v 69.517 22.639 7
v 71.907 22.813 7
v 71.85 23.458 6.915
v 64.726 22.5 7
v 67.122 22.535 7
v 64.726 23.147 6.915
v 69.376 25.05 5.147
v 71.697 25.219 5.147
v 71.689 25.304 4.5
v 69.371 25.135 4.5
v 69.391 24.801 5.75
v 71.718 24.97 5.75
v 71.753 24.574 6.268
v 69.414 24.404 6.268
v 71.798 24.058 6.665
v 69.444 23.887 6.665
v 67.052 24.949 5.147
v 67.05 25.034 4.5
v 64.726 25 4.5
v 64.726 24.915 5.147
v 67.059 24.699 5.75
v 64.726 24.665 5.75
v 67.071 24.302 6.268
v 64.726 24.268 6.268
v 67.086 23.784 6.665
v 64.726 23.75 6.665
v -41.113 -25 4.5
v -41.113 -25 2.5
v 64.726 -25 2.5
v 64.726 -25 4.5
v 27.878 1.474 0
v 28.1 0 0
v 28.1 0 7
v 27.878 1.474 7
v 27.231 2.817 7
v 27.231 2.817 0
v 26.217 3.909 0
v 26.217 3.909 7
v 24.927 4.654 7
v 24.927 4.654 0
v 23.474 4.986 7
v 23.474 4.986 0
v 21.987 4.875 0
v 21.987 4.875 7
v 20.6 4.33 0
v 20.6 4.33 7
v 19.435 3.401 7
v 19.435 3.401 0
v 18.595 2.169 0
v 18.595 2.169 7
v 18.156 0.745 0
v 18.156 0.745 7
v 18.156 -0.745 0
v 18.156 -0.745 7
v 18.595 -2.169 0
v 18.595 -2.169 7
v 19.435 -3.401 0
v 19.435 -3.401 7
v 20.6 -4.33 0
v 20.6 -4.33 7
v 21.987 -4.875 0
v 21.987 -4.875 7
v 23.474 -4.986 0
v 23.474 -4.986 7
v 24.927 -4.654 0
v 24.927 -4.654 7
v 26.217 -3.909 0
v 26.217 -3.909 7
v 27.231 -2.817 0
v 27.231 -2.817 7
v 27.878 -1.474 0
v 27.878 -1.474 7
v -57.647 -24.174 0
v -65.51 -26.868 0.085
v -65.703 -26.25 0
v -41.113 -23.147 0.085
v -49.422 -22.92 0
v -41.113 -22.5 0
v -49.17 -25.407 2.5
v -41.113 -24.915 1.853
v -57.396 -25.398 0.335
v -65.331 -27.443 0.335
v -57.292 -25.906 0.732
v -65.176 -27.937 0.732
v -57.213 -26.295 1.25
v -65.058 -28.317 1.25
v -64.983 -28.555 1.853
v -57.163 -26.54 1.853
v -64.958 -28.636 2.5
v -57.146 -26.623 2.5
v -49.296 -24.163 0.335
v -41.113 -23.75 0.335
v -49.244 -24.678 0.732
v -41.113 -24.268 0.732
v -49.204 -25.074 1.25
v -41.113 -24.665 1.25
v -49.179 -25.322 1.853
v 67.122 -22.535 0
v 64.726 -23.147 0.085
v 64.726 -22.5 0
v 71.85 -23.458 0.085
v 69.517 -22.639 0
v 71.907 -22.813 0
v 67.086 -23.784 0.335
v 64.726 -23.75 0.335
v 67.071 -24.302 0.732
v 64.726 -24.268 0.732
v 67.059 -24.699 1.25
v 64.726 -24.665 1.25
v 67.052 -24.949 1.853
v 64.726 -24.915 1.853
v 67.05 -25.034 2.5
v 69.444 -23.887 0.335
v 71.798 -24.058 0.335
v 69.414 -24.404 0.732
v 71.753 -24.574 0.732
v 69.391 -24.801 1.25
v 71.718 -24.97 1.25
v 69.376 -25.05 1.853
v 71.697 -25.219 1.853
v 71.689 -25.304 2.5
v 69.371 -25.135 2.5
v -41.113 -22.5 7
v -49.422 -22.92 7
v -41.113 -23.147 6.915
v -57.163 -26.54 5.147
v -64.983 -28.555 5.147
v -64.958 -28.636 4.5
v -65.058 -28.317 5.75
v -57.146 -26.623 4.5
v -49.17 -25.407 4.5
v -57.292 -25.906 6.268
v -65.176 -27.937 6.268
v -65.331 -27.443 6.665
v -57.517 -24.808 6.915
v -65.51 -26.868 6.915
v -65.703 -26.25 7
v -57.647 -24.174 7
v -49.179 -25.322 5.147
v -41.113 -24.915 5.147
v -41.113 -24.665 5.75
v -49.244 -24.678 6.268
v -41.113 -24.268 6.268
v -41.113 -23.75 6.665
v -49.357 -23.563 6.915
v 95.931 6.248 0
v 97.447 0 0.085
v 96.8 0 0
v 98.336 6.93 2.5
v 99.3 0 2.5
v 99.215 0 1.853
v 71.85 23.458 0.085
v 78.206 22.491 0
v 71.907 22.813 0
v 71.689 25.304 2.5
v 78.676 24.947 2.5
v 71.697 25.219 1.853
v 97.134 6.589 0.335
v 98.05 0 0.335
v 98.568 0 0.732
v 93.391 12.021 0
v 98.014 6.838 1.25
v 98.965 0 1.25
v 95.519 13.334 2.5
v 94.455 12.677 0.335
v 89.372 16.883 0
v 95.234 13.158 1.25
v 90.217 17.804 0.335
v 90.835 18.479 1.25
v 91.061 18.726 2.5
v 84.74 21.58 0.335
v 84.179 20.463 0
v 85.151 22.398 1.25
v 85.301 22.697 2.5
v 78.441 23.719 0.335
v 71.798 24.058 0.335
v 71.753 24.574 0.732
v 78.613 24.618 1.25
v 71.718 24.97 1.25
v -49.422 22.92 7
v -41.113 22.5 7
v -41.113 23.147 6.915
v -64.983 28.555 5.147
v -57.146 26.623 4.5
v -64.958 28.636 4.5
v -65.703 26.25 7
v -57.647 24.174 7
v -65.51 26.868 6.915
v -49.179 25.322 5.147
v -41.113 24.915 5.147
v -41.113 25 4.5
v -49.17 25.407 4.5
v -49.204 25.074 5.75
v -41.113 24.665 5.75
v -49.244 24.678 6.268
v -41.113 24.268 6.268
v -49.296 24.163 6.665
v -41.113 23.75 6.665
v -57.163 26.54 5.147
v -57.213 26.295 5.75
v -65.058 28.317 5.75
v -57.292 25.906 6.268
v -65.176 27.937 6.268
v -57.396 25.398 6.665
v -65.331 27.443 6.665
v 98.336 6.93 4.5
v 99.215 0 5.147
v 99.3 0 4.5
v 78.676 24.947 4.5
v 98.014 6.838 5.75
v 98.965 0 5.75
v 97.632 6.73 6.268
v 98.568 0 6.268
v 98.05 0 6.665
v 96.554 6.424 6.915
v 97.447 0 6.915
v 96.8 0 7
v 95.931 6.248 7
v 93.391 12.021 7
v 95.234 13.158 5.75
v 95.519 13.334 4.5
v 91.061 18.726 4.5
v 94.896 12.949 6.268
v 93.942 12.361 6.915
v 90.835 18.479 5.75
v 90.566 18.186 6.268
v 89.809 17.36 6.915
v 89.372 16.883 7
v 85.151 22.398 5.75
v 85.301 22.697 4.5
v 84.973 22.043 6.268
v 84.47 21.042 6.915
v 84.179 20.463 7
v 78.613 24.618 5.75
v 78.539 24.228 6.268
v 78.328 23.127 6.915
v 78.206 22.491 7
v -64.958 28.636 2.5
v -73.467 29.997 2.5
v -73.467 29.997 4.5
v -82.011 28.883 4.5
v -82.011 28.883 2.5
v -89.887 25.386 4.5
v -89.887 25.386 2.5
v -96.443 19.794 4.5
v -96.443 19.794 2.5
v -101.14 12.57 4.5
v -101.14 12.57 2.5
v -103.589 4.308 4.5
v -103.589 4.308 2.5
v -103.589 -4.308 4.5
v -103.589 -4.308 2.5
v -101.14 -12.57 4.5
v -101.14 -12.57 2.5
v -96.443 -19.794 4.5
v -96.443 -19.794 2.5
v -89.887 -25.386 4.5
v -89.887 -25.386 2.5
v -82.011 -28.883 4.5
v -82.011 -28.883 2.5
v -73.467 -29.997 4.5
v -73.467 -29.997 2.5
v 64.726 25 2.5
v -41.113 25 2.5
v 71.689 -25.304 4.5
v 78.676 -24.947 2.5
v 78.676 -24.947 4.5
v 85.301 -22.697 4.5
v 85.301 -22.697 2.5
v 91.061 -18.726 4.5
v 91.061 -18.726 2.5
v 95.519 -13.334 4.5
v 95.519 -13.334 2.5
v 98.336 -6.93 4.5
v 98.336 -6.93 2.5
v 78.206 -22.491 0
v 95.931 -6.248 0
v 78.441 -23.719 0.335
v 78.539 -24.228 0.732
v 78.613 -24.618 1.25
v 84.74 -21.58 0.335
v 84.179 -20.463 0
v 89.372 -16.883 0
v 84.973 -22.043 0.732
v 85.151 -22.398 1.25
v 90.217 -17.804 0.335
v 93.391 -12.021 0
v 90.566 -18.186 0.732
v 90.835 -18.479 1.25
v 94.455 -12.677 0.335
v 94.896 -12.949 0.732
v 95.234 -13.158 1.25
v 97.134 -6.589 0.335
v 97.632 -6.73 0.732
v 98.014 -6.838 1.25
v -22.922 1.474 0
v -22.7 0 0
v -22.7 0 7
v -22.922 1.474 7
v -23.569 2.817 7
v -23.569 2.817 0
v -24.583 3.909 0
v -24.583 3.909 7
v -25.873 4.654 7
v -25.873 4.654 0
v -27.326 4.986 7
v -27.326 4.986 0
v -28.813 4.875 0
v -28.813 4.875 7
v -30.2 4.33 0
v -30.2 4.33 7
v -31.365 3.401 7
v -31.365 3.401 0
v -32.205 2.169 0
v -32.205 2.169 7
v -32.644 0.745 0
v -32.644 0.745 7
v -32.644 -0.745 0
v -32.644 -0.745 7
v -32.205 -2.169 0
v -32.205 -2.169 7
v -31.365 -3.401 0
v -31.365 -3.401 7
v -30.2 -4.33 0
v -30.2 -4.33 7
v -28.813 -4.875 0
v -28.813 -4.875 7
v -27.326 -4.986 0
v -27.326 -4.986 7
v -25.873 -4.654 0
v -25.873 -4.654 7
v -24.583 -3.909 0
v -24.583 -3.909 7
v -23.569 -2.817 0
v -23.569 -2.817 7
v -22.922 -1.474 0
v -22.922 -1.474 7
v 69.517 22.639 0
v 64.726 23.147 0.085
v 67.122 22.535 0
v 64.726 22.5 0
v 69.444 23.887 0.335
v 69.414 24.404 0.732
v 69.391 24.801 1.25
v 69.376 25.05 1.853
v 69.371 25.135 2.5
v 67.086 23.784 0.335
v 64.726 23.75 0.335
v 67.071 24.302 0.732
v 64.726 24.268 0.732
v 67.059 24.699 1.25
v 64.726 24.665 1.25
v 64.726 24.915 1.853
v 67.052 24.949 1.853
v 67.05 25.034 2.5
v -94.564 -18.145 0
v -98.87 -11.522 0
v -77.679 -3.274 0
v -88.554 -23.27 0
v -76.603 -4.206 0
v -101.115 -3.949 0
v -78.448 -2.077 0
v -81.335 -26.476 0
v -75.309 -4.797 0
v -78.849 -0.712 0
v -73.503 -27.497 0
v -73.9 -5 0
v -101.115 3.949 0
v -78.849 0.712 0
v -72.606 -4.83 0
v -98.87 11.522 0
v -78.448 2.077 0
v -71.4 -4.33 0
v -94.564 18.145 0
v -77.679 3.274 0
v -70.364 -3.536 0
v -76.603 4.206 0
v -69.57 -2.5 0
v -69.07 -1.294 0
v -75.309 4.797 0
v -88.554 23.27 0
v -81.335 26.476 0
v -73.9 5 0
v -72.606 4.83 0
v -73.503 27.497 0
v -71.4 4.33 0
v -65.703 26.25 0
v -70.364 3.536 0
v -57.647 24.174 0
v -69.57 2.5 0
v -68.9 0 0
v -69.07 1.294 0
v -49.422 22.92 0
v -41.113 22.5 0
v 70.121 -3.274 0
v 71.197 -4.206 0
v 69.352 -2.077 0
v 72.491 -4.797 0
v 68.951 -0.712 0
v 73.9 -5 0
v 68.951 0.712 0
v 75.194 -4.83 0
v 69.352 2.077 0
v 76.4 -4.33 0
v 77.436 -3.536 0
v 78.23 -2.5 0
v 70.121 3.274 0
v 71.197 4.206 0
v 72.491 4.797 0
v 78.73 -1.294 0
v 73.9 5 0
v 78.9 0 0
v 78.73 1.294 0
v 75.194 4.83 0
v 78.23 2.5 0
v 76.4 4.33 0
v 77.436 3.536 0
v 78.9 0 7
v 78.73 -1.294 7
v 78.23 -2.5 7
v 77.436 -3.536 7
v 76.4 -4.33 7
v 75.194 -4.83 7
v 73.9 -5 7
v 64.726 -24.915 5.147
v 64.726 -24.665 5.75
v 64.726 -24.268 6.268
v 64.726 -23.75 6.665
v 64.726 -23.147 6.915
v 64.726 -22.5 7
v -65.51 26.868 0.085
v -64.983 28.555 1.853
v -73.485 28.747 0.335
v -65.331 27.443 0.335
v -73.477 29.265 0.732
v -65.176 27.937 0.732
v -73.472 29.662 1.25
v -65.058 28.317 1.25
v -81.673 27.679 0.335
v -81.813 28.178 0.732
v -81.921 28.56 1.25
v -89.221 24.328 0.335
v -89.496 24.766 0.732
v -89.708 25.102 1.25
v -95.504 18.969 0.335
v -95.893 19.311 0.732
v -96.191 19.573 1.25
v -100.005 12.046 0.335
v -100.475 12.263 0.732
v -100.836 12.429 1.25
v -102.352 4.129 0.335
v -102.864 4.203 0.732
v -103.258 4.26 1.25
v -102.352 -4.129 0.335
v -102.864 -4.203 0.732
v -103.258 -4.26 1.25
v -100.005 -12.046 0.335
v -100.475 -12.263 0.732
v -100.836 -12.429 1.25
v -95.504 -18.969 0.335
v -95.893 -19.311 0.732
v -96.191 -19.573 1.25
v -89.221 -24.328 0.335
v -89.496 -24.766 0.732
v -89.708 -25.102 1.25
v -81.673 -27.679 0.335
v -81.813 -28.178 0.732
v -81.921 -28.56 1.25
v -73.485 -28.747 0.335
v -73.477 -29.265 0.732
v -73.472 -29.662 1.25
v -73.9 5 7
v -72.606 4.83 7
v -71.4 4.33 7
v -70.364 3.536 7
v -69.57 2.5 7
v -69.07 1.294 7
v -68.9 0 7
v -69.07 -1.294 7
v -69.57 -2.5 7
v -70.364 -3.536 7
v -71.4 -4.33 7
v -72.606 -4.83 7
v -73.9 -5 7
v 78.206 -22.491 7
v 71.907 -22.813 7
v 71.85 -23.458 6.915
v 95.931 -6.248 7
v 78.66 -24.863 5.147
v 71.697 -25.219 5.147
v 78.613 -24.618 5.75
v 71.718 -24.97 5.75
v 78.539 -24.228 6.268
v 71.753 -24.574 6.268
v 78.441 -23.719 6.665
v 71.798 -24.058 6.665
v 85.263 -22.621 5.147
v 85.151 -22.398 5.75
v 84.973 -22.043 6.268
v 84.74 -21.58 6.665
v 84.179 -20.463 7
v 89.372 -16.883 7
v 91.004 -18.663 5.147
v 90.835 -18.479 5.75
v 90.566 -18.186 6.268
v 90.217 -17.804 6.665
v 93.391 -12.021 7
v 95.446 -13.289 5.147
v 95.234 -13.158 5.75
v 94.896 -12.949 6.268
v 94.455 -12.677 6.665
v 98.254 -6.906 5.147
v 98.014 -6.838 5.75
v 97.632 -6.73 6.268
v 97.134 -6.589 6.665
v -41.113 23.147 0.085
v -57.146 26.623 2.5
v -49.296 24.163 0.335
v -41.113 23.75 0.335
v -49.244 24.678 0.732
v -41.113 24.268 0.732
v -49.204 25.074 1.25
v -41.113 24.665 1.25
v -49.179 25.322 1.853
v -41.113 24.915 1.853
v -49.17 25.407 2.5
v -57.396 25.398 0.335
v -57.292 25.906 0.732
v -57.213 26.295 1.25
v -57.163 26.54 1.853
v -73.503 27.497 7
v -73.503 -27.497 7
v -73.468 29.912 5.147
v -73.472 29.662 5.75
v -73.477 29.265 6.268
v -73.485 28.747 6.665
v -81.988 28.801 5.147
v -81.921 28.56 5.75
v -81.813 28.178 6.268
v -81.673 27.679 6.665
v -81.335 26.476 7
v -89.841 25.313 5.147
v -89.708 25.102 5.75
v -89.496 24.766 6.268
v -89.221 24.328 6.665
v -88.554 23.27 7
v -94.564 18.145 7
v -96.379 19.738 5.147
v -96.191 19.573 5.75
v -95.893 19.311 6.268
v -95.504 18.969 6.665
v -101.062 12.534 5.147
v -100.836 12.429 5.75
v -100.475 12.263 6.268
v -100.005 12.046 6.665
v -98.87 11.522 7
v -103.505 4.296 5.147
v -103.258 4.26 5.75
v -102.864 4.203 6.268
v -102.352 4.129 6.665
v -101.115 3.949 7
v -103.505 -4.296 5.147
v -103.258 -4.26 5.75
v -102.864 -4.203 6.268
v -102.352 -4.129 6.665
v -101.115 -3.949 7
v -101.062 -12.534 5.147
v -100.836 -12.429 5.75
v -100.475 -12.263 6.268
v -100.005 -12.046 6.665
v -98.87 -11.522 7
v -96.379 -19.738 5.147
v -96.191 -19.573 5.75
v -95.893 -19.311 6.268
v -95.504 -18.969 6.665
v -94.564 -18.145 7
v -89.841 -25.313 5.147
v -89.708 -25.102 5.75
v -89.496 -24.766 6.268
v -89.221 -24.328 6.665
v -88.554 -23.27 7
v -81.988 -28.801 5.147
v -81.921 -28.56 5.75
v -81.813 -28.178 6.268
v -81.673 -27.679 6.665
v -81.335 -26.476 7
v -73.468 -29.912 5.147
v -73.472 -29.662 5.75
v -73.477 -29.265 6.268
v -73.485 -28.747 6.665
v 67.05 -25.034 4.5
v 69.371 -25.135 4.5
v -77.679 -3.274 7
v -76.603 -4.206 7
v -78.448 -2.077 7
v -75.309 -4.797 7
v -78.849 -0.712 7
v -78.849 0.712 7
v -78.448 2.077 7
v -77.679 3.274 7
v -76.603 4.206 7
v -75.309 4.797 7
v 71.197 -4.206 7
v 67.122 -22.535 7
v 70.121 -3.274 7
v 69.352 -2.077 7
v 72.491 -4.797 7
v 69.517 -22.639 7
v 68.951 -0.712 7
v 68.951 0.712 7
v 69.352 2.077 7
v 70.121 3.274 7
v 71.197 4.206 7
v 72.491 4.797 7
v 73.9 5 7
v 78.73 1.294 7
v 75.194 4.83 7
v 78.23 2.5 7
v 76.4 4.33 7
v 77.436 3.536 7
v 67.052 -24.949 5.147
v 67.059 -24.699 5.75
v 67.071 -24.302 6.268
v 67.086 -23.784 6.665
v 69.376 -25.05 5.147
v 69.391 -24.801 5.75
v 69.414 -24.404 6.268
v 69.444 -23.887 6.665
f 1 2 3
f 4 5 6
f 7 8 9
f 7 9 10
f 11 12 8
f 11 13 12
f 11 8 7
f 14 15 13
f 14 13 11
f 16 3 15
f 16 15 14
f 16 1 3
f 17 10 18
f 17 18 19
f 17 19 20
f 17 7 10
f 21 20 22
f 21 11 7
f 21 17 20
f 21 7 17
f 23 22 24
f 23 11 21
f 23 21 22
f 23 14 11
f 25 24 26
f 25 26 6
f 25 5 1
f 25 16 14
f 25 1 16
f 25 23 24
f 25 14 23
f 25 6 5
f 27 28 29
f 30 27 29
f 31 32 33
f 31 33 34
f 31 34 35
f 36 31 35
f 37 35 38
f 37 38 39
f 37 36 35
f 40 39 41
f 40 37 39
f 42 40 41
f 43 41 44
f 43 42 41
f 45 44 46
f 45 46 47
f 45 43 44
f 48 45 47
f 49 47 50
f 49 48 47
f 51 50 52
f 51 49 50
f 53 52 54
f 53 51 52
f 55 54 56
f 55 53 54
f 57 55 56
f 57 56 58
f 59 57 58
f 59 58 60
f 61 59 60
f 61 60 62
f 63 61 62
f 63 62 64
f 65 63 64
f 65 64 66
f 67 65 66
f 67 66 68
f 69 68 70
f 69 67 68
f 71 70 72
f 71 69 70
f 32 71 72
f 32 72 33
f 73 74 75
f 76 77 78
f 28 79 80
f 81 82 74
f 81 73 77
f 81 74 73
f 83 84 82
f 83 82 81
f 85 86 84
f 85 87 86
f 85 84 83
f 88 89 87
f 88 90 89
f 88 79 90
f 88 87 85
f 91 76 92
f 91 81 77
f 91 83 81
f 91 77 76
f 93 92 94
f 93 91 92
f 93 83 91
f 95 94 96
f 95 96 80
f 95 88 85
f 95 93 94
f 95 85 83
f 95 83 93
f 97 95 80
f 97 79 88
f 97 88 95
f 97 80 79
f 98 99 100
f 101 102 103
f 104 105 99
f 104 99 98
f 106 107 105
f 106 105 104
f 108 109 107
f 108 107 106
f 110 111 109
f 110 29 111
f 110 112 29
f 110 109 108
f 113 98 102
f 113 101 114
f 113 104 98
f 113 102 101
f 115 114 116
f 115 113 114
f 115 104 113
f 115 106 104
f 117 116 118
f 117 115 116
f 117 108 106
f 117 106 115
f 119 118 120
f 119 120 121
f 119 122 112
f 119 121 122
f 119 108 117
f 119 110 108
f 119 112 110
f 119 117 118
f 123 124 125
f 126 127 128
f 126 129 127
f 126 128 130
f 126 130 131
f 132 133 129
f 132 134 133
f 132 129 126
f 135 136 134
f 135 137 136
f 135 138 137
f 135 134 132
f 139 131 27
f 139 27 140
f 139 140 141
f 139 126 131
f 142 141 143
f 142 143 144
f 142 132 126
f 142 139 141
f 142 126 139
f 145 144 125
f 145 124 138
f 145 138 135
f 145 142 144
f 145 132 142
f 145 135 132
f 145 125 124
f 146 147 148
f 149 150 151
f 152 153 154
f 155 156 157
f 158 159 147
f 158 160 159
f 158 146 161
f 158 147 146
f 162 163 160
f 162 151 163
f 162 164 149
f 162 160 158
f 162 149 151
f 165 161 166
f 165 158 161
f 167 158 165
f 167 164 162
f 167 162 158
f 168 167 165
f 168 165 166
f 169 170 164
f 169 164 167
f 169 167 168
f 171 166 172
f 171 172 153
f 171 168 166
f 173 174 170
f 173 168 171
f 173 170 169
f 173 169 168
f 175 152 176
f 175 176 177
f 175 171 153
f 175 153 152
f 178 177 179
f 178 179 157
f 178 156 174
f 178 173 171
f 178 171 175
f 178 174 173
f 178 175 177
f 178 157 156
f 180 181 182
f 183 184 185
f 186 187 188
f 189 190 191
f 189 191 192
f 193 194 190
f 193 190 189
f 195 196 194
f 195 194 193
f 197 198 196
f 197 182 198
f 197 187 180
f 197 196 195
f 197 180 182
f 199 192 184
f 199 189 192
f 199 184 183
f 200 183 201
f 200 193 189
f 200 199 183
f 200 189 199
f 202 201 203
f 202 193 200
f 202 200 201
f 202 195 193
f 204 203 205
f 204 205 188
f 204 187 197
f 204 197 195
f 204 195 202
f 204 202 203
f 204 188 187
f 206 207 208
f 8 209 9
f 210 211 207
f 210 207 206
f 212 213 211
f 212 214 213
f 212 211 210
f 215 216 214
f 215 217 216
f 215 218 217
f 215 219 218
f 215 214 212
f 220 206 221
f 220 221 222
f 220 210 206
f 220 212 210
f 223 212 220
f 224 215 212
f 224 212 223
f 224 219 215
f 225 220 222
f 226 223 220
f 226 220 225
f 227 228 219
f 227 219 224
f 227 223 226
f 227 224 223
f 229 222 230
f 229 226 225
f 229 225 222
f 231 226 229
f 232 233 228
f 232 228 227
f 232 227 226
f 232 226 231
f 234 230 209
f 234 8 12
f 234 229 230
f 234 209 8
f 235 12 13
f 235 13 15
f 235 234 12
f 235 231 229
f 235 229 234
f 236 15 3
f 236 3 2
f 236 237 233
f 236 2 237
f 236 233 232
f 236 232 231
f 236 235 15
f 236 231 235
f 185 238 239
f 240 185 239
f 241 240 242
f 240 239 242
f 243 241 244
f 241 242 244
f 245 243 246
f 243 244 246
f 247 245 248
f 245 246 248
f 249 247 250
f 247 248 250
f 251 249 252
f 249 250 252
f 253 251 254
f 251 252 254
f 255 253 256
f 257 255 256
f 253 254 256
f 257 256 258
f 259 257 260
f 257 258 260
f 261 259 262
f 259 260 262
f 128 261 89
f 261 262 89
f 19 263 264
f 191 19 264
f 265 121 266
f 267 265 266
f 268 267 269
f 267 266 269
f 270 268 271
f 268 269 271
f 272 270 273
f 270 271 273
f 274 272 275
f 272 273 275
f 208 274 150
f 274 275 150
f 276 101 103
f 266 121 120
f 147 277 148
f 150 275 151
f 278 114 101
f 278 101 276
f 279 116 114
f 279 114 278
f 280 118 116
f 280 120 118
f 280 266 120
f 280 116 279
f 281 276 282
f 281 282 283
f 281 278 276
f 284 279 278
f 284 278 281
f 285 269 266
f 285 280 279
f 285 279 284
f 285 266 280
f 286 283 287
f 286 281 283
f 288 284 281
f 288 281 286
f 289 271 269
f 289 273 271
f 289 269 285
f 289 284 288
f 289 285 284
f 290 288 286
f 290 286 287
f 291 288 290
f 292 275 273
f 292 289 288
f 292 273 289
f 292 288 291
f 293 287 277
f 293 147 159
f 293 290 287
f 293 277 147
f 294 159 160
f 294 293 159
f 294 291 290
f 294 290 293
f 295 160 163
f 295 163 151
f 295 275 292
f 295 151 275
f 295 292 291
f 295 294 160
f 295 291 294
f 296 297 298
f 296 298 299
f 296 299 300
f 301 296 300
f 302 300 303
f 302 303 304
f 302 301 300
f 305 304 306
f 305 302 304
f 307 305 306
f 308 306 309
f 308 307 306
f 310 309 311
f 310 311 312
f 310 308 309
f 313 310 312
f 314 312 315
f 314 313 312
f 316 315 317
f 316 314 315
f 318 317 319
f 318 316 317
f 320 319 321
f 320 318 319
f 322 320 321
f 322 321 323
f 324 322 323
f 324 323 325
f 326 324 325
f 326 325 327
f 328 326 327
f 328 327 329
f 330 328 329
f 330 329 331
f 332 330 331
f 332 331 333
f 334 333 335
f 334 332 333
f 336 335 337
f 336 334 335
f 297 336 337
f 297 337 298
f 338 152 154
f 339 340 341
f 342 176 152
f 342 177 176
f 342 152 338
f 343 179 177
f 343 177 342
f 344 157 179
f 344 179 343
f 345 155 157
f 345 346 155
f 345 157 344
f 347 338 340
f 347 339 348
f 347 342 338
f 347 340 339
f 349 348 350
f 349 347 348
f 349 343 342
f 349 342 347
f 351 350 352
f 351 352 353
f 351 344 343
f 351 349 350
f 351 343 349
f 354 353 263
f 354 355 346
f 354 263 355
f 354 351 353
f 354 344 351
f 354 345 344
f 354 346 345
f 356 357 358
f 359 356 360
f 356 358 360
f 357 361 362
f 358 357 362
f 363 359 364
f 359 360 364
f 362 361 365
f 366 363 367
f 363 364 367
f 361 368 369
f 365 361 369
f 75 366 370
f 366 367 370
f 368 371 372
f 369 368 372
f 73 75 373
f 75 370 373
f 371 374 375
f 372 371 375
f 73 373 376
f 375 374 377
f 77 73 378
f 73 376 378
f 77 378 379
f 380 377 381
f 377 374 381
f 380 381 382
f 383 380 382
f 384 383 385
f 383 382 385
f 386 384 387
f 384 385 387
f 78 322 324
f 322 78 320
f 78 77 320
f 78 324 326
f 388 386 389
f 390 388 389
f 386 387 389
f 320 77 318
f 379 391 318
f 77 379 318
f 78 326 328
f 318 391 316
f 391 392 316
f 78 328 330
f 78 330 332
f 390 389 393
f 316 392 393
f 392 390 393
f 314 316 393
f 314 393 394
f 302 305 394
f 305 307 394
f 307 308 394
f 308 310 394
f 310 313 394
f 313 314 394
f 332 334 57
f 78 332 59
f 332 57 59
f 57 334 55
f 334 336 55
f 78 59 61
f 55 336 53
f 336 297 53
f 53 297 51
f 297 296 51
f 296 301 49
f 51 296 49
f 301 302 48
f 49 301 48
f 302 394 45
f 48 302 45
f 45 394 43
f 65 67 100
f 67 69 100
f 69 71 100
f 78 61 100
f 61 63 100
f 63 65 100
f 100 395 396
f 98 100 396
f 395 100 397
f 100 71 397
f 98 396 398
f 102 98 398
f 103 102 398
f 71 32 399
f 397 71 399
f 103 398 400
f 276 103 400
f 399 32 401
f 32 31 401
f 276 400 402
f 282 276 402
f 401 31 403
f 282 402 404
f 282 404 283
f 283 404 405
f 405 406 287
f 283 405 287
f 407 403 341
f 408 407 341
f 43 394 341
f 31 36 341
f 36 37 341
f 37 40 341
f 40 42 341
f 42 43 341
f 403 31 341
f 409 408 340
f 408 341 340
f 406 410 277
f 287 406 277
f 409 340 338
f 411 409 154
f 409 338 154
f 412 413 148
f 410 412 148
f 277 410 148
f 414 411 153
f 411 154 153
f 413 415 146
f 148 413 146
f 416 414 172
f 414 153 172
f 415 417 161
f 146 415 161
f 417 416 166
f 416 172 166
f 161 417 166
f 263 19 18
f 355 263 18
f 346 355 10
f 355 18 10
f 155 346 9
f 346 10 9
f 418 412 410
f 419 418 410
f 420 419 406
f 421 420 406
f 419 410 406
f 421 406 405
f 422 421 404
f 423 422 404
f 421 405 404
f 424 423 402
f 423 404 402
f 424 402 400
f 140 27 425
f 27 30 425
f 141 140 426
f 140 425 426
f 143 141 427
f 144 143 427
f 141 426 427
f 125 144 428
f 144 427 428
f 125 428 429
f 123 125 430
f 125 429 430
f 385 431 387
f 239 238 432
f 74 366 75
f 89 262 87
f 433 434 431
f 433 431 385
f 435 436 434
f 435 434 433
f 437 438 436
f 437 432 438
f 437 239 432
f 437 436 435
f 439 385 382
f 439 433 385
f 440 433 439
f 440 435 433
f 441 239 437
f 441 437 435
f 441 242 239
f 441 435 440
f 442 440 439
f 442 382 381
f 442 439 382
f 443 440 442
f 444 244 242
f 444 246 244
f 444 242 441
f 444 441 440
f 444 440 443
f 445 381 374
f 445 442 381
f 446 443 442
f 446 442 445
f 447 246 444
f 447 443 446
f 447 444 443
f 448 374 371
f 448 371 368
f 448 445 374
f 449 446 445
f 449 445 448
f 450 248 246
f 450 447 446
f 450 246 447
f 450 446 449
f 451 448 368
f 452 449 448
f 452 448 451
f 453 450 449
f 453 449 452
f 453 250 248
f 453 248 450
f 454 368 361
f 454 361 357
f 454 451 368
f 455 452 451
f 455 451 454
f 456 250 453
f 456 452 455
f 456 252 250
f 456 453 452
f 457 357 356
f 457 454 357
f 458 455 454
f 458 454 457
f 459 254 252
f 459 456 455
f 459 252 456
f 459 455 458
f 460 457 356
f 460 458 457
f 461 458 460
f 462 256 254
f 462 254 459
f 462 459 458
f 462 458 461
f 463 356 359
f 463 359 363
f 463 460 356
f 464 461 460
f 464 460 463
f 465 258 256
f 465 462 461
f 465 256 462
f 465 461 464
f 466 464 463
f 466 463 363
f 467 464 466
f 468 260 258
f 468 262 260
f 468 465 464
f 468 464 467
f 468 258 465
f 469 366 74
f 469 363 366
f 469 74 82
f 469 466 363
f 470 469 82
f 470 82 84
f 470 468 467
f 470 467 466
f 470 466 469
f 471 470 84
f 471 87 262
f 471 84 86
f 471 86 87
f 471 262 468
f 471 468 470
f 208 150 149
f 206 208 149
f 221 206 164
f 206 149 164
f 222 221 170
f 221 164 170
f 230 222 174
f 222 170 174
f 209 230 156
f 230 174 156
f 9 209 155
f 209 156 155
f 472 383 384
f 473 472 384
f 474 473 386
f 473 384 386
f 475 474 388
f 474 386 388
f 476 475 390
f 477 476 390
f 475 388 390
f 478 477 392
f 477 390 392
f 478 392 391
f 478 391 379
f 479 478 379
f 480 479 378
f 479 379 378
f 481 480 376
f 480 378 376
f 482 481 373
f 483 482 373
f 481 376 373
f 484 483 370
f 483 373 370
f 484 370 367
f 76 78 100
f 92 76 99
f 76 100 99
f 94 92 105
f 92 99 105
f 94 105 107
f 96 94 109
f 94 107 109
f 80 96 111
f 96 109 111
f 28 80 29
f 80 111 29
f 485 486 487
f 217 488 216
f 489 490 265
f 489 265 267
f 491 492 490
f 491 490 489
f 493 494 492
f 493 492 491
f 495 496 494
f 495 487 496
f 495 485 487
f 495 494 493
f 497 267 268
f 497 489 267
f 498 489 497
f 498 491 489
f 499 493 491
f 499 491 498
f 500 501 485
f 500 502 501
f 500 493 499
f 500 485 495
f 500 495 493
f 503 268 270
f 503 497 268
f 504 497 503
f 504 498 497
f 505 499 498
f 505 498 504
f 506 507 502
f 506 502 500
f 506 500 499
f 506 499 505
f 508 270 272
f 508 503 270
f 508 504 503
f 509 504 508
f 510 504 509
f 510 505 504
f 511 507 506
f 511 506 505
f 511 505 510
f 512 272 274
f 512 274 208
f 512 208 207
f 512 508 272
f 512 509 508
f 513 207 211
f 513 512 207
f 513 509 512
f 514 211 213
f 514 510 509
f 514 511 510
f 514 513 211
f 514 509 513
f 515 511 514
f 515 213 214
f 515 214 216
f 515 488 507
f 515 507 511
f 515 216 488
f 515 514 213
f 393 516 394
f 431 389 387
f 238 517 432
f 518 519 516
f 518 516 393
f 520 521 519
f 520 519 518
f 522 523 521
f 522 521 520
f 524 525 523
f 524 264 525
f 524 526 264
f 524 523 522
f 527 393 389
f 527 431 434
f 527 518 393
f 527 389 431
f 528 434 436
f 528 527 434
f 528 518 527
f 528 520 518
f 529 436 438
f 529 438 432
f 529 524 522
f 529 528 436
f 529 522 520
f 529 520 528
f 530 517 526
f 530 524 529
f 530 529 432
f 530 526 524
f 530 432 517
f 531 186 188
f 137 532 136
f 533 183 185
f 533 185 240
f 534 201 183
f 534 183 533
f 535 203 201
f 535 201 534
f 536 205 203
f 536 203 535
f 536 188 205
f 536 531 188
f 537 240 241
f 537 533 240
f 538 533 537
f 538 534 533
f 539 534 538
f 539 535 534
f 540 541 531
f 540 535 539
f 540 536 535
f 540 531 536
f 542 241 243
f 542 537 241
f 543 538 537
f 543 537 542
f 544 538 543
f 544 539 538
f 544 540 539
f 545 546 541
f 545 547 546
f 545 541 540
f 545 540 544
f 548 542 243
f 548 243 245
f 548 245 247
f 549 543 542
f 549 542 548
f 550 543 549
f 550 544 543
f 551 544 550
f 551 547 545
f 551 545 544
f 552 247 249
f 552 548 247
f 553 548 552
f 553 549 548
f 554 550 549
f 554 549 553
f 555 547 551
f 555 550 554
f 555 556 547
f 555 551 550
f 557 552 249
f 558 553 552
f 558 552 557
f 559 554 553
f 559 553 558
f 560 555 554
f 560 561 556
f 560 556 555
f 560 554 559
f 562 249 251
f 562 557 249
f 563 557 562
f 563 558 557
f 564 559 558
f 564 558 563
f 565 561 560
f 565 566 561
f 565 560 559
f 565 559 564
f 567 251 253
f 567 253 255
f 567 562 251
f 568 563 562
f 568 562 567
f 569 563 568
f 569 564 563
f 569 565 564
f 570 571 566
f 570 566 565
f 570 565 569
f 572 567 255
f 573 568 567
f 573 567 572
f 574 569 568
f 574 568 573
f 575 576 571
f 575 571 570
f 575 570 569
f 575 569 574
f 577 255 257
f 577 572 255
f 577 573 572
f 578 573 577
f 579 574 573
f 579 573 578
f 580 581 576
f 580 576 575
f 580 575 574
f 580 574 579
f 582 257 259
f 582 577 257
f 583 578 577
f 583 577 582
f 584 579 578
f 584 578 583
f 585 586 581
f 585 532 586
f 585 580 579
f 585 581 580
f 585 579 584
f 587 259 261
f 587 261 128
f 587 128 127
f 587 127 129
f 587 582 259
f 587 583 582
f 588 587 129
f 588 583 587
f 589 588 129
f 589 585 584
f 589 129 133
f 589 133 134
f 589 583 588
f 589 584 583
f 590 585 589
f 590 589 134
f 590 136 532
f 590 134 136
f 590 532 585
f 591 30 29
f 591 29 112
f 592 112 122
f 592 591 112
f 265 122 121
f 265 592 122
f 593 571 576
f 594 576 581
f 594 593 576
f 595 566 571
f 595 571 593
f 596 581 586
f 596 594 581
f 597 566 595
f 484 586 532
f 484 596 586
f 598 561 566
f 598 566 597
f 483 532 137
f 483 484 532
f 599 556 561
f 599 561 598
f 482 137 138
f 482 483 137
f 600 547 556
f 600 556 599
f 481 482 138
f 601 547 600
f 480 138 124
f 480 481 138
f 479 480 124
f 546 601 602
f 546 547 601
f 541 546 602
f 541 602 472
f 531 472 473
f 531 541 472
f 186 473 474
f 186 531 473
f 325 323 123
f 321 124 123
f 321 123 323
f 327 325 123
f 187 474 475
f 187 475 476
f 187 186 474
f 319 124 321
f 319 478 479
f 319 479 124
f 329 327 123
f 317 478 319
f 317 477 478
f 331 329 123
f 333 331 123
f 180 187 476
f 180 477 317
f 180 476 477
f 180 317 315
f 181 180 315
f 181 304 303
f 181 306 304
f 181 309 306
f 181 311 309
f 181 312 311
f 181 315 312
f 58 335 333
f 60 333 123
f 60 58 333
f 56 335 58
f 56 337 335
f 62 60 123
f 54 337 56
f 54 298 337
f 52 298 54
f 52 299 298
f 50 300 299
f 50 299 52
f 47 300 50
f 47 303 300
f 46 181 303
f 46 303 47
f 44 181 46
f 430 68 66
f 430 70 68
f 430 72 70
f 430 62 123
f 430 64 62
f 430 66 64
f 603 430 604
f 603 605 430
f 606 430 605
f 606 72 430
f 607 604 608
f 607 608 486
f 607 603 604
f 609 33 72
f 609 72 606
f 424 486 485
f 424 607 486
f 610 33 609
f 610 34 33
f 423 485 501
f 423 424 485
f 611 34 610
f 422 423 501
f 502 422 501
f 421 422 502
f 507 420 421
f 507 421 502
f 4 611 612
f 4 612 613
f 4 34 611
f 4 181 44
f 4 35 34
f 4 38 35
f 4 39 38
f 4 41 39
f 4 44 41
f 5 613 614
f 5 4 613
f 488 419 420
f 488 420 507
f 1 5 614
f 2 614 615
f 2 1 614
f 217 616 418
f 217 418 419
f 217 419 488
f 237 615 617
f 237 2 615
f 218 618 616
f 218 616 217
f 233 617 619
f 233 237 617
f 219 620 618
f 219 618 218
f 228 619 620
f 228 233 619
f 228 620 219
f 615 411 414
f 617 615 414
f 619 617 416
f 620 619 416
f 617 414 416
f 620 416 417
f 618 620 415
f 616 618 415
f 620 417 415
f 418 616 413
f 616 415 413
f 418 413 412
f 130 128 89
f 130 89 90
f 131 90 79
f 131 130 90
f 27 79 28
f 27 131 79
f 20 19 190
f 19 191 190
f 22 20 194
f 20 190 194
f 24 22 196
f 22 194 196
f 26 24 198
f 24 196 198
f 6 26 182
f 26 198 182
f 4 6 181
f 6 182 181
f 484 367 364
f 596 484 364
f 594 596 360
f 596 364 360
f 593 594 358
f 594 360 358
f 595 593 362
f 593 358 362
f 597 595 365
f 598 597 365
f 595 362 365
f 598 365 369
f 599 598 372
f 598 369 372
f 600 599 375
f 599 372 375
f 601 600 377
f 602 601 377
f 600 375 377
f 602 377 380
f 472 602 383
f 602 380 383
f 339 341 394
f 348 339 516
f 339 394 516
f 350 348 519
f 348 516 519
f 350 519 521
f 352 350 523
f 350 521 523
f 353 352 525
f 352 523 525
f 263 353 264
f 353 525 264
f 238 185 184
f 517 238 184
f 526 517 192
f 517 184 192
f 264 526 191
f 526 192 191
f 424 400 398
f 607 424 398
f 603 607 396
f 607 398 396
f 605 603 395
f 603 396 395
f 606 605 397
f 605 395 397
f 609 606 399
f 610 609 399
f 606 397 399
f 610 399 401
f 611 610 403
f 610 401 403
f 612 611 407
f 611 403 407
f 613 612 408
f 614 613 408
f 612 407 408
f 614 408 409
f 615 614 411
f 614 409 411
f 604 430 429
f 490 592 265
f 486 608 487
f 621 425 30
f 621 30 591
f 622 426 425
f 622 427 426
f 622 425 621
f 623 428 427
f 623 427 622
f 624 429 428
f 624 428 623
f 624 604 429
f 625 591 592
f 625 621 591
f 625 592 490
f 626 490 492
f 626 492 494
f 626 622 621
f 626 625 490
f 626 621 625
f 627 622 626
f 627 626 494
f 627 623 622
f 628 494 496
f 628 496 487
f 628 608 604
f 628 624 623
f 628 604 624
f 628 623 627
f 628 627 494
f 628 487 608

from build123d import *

# Parameters (mm, degrees)
SKETCH1_R           = 5
BOSS_EXTRUDE1_DEPTH = 7
FILLET1_R           = 80
FILLET2_R           = 2.5


with BuildPart() as part:
    # Sketch1 → Boss-Extrude1 (new body)
    # profile 1 of 9: a face of its own
    with BuildSketch(Plane.XY):
        with BuildLine():
            Line((69.410011136, 25), (-57.316876048, 25))
            ThreePointArc((-57.316876048, 25), (-47.466179631, 14.186371655), (-43.9, 0))
            ThreePointArc((-43.9, 0), (-47.466179631, -14.186371655), (-57.316876048, -25))
            Line((-57.316876048, -25), (69.410011136, -25))
            ThreePointArc((69.410011136, -25), (48.5, 0), (69.410011136, 25))
        make_face()
        with Locations((-27.7, 0)):
            Circle(SKETCH1_R, mode=Mode.SUBTRACT)
        with Locations((23.1, 0)):
            Circle(SKETCH1_R, mode=Mode.SUBTRACT)
    # profile 2 of 9: a face of its own
    with BuildSketch(Plane.XY):
        with BuildLine():
            ThreePointArc((99.3, 0), (90.195924074, 19.483399564), (69.410011136, 25))
            Line((69.410011136, 25), (73.9, 25))
            Line((73.9, 25), (73.9, 5))
            ThreePointArc((73.9, 5), (77.435533906, 3.535533906), (78.9, 0))
            ThreePointArc((78.9, 0), (77.435533906, -3.535533906), (73.9, -5))
            Line((73.9, -5), (73.9, -25))
            Line((73.9, -25), (69.410011136, -25))
            ThreePointArc((69.410011136, -25), (90.195924074, -19.483399564), (99.3, 0))
        make_face()
    # profile 3 of 9: a face of its own
    with BuildSketch(Plane.XY):
        with BuildLine():
            Line((73.9, 25), (69.410011136, 25))
            ThreePointArc((69.410011136, 25), (48.5, 0), (69.410011136, -25))
            Line((69.410011136, -25), (73.9, -25))
            Line((73.9, -25), (73.9, -5))
            ThreePointArc((73.9, -5), (68.9, 0), (73.9, 5))
            Line((73.9, 5), (73.9, 25))
        make_face()
    # profile 4 of 9: a face of its own
    with BuildSketch(Plane.XY):
        with BuildLine():
            ThreePointArc((99.3, 0), (90.195924074, 19.483399564), (69.410011136, 25))
            Line((69.410011136, 25), (73.9, 25))
            Line((73.9, 25), (73.9, 5))
            ThreePointArc((73.9, 5), (77.435533906, 3.535533906), (78.9, 0))
            ThreePointArc((78.9, 0), (77.435533906, -3.535533906), (73.9, -5))
            Line((73.9, -5), (73.9, -25))
            Line((73.9, -25), (69.410011136, -25))
            ThreePointArc((69.410011136, -25), (90.195924074, -19.483399564), (99.3, 0))
        make_face()
    # profile 5 of 9: a face of its own
    with BuildSketch(Plane.XY):
        with BuildLine():
            Line((73.9, 25), (69.410011136, 25))
            ThreePointArc((69.410011136, 25), (48.5, 0), (69.410011136, -25))
            Line((69.410011136, -25), (73.9, -25))
            Line((73.9, -25), (73.9, -5))
            ThreePointArc((73.9, -5), (68.9, 0), (73.9, 5))
            Line((73.9, 5), (73.9, 25))
        make_face()
    # profile 6 of 9: a face of its own
    with BuildSketch(Plane.XY):
        with BuildLine():
            Line((-73.9, 5), (-73.9, 25))
            Line((-73.9, 25), (-57.316876048, 25))
            ThreePointArc((-57.316876048, 25), (-103.9, 0), (-57.316876048, -25))
            Line((-57.316876048, -25), (-73.9, -25))
            Line((-73.9, -25), (-73.9, -5))
            ThreePointArc((-73.9, -5), (-78.9, 0), (-73.9, 5))
        make_face()
    # profile 7 of 9: a face of its own
    with BuildSketch(Plane.XY):
        with BuildLine():
            Line((-57.316876048, 25), (-73.9, 25))
            Line((-73.9, 25), (-73.9, 5))
            ThreePointArc((-73.9, 5), (-70.364466094, 3.535533906), (-68.9, 0))
            ThreePointArc((-68.9, 0), (-70.364466094, -3.535533906), (-73.9, -5))
            Line((-73.9, -5), (-73.9, -25))
            Line((-73.9, -25), (-57.316876048, -25))
            ThreePointArc((-57.316876048, -25), (-47.466179631, -14.186371655), (-43.9, 0))
            ThreePointArc((-43.9, 0), (-47.466179631, 14.186371655), (-57.316876048, 25))
        make_face()
    # profile 8 of 9: a face of its own
    with BuildSketch(Plane.XY):
        with BuildLine():
            Line((-73.9, 5), (-73.9, 25))
            Line((-73.9, 25), (-57.316876048, 25))
            ThreePointArc((-57.316876048, 25), (-103.9, 0), (-57.316876048, -25))
            Line((-57.316876048, -25), (-73.9, -25))
            Line((-73.9, -25), (-73.9, -5))
            ThreePointArc((-73.9, -5), (-78.9, 0), (-73.9, 5))
        make_face()
    # profile 9 of 9: a face of its own
    with BuildSketch(Plane.XY):
        with BuildLine():
            Line((-57.316876048, 25), (-73.9, 25))
            Line((-73.9, 25), (-73.9, 5))
            ThreePointArc((-73.9, 5), (-70.364466094, 3.535533906), (-68.9, 0))
            ThreePointArc((-68.9, 0), (-70.364466094, -3.535533906), (-73.9, -5))
            Line((-73.9, -5), (-73.9, -25))
            Line((-73.9, -25), (-57.316876048, -25))
            ThreePointArc((-57.316876048, -25), (-47.466179631, -14.186371655), (-43.9, 0))
            ThreePointArc((-43.9, 0), (-47.466179631, 14.186371655), (-57.316876048, 25))
        make_face()
    extrude(amount=BOSS_EXTRUDE1_DEPTH)

    # Fillet1
    fillet1_edges = [part.edges().sort_by_distance(p)[0] for p in [
        (-57.316876048, 25, 3.5),
        (69.410011136, 25, 3.5),
        (69.410011136, -25, 3.5),
        (-57.316876048, -25, 3.5),
    ]]
    fillet(fillet1_edges, radius=FILLET1_R)

    # Fillet2
    fillet2_edges = [part.edges().sort_by_distance(p)[0] for p in [
        (99.3, 0, 0),
        (99.3, 0, 7),
        (11.806658334, -25, 0),
        (11.806658334, -25, 7),
        (11.806658334, 25, 0),
        (11.806658334, 25, 7),
        (-103.9, 0, 0),
        (-103.9, 0, 7),
        (68.210978782, -25.075937369, 0),
        (68.210978782, -25.075937369, 7),
        (68.210978782, 25.075937369, 0),
        (68.210978782, 25.075937369, 7),
        (-53.173261162, -25.914315742, 0),
        (-53.173261162, -25.914315742, 7),
        (-53.173261162, 25.914315742, 0),
        (-53.173261162, 25.914315742, 7),
    ]]
    fillet(fillet2_edges, radius=FILLET2_R)


solid = part.part
